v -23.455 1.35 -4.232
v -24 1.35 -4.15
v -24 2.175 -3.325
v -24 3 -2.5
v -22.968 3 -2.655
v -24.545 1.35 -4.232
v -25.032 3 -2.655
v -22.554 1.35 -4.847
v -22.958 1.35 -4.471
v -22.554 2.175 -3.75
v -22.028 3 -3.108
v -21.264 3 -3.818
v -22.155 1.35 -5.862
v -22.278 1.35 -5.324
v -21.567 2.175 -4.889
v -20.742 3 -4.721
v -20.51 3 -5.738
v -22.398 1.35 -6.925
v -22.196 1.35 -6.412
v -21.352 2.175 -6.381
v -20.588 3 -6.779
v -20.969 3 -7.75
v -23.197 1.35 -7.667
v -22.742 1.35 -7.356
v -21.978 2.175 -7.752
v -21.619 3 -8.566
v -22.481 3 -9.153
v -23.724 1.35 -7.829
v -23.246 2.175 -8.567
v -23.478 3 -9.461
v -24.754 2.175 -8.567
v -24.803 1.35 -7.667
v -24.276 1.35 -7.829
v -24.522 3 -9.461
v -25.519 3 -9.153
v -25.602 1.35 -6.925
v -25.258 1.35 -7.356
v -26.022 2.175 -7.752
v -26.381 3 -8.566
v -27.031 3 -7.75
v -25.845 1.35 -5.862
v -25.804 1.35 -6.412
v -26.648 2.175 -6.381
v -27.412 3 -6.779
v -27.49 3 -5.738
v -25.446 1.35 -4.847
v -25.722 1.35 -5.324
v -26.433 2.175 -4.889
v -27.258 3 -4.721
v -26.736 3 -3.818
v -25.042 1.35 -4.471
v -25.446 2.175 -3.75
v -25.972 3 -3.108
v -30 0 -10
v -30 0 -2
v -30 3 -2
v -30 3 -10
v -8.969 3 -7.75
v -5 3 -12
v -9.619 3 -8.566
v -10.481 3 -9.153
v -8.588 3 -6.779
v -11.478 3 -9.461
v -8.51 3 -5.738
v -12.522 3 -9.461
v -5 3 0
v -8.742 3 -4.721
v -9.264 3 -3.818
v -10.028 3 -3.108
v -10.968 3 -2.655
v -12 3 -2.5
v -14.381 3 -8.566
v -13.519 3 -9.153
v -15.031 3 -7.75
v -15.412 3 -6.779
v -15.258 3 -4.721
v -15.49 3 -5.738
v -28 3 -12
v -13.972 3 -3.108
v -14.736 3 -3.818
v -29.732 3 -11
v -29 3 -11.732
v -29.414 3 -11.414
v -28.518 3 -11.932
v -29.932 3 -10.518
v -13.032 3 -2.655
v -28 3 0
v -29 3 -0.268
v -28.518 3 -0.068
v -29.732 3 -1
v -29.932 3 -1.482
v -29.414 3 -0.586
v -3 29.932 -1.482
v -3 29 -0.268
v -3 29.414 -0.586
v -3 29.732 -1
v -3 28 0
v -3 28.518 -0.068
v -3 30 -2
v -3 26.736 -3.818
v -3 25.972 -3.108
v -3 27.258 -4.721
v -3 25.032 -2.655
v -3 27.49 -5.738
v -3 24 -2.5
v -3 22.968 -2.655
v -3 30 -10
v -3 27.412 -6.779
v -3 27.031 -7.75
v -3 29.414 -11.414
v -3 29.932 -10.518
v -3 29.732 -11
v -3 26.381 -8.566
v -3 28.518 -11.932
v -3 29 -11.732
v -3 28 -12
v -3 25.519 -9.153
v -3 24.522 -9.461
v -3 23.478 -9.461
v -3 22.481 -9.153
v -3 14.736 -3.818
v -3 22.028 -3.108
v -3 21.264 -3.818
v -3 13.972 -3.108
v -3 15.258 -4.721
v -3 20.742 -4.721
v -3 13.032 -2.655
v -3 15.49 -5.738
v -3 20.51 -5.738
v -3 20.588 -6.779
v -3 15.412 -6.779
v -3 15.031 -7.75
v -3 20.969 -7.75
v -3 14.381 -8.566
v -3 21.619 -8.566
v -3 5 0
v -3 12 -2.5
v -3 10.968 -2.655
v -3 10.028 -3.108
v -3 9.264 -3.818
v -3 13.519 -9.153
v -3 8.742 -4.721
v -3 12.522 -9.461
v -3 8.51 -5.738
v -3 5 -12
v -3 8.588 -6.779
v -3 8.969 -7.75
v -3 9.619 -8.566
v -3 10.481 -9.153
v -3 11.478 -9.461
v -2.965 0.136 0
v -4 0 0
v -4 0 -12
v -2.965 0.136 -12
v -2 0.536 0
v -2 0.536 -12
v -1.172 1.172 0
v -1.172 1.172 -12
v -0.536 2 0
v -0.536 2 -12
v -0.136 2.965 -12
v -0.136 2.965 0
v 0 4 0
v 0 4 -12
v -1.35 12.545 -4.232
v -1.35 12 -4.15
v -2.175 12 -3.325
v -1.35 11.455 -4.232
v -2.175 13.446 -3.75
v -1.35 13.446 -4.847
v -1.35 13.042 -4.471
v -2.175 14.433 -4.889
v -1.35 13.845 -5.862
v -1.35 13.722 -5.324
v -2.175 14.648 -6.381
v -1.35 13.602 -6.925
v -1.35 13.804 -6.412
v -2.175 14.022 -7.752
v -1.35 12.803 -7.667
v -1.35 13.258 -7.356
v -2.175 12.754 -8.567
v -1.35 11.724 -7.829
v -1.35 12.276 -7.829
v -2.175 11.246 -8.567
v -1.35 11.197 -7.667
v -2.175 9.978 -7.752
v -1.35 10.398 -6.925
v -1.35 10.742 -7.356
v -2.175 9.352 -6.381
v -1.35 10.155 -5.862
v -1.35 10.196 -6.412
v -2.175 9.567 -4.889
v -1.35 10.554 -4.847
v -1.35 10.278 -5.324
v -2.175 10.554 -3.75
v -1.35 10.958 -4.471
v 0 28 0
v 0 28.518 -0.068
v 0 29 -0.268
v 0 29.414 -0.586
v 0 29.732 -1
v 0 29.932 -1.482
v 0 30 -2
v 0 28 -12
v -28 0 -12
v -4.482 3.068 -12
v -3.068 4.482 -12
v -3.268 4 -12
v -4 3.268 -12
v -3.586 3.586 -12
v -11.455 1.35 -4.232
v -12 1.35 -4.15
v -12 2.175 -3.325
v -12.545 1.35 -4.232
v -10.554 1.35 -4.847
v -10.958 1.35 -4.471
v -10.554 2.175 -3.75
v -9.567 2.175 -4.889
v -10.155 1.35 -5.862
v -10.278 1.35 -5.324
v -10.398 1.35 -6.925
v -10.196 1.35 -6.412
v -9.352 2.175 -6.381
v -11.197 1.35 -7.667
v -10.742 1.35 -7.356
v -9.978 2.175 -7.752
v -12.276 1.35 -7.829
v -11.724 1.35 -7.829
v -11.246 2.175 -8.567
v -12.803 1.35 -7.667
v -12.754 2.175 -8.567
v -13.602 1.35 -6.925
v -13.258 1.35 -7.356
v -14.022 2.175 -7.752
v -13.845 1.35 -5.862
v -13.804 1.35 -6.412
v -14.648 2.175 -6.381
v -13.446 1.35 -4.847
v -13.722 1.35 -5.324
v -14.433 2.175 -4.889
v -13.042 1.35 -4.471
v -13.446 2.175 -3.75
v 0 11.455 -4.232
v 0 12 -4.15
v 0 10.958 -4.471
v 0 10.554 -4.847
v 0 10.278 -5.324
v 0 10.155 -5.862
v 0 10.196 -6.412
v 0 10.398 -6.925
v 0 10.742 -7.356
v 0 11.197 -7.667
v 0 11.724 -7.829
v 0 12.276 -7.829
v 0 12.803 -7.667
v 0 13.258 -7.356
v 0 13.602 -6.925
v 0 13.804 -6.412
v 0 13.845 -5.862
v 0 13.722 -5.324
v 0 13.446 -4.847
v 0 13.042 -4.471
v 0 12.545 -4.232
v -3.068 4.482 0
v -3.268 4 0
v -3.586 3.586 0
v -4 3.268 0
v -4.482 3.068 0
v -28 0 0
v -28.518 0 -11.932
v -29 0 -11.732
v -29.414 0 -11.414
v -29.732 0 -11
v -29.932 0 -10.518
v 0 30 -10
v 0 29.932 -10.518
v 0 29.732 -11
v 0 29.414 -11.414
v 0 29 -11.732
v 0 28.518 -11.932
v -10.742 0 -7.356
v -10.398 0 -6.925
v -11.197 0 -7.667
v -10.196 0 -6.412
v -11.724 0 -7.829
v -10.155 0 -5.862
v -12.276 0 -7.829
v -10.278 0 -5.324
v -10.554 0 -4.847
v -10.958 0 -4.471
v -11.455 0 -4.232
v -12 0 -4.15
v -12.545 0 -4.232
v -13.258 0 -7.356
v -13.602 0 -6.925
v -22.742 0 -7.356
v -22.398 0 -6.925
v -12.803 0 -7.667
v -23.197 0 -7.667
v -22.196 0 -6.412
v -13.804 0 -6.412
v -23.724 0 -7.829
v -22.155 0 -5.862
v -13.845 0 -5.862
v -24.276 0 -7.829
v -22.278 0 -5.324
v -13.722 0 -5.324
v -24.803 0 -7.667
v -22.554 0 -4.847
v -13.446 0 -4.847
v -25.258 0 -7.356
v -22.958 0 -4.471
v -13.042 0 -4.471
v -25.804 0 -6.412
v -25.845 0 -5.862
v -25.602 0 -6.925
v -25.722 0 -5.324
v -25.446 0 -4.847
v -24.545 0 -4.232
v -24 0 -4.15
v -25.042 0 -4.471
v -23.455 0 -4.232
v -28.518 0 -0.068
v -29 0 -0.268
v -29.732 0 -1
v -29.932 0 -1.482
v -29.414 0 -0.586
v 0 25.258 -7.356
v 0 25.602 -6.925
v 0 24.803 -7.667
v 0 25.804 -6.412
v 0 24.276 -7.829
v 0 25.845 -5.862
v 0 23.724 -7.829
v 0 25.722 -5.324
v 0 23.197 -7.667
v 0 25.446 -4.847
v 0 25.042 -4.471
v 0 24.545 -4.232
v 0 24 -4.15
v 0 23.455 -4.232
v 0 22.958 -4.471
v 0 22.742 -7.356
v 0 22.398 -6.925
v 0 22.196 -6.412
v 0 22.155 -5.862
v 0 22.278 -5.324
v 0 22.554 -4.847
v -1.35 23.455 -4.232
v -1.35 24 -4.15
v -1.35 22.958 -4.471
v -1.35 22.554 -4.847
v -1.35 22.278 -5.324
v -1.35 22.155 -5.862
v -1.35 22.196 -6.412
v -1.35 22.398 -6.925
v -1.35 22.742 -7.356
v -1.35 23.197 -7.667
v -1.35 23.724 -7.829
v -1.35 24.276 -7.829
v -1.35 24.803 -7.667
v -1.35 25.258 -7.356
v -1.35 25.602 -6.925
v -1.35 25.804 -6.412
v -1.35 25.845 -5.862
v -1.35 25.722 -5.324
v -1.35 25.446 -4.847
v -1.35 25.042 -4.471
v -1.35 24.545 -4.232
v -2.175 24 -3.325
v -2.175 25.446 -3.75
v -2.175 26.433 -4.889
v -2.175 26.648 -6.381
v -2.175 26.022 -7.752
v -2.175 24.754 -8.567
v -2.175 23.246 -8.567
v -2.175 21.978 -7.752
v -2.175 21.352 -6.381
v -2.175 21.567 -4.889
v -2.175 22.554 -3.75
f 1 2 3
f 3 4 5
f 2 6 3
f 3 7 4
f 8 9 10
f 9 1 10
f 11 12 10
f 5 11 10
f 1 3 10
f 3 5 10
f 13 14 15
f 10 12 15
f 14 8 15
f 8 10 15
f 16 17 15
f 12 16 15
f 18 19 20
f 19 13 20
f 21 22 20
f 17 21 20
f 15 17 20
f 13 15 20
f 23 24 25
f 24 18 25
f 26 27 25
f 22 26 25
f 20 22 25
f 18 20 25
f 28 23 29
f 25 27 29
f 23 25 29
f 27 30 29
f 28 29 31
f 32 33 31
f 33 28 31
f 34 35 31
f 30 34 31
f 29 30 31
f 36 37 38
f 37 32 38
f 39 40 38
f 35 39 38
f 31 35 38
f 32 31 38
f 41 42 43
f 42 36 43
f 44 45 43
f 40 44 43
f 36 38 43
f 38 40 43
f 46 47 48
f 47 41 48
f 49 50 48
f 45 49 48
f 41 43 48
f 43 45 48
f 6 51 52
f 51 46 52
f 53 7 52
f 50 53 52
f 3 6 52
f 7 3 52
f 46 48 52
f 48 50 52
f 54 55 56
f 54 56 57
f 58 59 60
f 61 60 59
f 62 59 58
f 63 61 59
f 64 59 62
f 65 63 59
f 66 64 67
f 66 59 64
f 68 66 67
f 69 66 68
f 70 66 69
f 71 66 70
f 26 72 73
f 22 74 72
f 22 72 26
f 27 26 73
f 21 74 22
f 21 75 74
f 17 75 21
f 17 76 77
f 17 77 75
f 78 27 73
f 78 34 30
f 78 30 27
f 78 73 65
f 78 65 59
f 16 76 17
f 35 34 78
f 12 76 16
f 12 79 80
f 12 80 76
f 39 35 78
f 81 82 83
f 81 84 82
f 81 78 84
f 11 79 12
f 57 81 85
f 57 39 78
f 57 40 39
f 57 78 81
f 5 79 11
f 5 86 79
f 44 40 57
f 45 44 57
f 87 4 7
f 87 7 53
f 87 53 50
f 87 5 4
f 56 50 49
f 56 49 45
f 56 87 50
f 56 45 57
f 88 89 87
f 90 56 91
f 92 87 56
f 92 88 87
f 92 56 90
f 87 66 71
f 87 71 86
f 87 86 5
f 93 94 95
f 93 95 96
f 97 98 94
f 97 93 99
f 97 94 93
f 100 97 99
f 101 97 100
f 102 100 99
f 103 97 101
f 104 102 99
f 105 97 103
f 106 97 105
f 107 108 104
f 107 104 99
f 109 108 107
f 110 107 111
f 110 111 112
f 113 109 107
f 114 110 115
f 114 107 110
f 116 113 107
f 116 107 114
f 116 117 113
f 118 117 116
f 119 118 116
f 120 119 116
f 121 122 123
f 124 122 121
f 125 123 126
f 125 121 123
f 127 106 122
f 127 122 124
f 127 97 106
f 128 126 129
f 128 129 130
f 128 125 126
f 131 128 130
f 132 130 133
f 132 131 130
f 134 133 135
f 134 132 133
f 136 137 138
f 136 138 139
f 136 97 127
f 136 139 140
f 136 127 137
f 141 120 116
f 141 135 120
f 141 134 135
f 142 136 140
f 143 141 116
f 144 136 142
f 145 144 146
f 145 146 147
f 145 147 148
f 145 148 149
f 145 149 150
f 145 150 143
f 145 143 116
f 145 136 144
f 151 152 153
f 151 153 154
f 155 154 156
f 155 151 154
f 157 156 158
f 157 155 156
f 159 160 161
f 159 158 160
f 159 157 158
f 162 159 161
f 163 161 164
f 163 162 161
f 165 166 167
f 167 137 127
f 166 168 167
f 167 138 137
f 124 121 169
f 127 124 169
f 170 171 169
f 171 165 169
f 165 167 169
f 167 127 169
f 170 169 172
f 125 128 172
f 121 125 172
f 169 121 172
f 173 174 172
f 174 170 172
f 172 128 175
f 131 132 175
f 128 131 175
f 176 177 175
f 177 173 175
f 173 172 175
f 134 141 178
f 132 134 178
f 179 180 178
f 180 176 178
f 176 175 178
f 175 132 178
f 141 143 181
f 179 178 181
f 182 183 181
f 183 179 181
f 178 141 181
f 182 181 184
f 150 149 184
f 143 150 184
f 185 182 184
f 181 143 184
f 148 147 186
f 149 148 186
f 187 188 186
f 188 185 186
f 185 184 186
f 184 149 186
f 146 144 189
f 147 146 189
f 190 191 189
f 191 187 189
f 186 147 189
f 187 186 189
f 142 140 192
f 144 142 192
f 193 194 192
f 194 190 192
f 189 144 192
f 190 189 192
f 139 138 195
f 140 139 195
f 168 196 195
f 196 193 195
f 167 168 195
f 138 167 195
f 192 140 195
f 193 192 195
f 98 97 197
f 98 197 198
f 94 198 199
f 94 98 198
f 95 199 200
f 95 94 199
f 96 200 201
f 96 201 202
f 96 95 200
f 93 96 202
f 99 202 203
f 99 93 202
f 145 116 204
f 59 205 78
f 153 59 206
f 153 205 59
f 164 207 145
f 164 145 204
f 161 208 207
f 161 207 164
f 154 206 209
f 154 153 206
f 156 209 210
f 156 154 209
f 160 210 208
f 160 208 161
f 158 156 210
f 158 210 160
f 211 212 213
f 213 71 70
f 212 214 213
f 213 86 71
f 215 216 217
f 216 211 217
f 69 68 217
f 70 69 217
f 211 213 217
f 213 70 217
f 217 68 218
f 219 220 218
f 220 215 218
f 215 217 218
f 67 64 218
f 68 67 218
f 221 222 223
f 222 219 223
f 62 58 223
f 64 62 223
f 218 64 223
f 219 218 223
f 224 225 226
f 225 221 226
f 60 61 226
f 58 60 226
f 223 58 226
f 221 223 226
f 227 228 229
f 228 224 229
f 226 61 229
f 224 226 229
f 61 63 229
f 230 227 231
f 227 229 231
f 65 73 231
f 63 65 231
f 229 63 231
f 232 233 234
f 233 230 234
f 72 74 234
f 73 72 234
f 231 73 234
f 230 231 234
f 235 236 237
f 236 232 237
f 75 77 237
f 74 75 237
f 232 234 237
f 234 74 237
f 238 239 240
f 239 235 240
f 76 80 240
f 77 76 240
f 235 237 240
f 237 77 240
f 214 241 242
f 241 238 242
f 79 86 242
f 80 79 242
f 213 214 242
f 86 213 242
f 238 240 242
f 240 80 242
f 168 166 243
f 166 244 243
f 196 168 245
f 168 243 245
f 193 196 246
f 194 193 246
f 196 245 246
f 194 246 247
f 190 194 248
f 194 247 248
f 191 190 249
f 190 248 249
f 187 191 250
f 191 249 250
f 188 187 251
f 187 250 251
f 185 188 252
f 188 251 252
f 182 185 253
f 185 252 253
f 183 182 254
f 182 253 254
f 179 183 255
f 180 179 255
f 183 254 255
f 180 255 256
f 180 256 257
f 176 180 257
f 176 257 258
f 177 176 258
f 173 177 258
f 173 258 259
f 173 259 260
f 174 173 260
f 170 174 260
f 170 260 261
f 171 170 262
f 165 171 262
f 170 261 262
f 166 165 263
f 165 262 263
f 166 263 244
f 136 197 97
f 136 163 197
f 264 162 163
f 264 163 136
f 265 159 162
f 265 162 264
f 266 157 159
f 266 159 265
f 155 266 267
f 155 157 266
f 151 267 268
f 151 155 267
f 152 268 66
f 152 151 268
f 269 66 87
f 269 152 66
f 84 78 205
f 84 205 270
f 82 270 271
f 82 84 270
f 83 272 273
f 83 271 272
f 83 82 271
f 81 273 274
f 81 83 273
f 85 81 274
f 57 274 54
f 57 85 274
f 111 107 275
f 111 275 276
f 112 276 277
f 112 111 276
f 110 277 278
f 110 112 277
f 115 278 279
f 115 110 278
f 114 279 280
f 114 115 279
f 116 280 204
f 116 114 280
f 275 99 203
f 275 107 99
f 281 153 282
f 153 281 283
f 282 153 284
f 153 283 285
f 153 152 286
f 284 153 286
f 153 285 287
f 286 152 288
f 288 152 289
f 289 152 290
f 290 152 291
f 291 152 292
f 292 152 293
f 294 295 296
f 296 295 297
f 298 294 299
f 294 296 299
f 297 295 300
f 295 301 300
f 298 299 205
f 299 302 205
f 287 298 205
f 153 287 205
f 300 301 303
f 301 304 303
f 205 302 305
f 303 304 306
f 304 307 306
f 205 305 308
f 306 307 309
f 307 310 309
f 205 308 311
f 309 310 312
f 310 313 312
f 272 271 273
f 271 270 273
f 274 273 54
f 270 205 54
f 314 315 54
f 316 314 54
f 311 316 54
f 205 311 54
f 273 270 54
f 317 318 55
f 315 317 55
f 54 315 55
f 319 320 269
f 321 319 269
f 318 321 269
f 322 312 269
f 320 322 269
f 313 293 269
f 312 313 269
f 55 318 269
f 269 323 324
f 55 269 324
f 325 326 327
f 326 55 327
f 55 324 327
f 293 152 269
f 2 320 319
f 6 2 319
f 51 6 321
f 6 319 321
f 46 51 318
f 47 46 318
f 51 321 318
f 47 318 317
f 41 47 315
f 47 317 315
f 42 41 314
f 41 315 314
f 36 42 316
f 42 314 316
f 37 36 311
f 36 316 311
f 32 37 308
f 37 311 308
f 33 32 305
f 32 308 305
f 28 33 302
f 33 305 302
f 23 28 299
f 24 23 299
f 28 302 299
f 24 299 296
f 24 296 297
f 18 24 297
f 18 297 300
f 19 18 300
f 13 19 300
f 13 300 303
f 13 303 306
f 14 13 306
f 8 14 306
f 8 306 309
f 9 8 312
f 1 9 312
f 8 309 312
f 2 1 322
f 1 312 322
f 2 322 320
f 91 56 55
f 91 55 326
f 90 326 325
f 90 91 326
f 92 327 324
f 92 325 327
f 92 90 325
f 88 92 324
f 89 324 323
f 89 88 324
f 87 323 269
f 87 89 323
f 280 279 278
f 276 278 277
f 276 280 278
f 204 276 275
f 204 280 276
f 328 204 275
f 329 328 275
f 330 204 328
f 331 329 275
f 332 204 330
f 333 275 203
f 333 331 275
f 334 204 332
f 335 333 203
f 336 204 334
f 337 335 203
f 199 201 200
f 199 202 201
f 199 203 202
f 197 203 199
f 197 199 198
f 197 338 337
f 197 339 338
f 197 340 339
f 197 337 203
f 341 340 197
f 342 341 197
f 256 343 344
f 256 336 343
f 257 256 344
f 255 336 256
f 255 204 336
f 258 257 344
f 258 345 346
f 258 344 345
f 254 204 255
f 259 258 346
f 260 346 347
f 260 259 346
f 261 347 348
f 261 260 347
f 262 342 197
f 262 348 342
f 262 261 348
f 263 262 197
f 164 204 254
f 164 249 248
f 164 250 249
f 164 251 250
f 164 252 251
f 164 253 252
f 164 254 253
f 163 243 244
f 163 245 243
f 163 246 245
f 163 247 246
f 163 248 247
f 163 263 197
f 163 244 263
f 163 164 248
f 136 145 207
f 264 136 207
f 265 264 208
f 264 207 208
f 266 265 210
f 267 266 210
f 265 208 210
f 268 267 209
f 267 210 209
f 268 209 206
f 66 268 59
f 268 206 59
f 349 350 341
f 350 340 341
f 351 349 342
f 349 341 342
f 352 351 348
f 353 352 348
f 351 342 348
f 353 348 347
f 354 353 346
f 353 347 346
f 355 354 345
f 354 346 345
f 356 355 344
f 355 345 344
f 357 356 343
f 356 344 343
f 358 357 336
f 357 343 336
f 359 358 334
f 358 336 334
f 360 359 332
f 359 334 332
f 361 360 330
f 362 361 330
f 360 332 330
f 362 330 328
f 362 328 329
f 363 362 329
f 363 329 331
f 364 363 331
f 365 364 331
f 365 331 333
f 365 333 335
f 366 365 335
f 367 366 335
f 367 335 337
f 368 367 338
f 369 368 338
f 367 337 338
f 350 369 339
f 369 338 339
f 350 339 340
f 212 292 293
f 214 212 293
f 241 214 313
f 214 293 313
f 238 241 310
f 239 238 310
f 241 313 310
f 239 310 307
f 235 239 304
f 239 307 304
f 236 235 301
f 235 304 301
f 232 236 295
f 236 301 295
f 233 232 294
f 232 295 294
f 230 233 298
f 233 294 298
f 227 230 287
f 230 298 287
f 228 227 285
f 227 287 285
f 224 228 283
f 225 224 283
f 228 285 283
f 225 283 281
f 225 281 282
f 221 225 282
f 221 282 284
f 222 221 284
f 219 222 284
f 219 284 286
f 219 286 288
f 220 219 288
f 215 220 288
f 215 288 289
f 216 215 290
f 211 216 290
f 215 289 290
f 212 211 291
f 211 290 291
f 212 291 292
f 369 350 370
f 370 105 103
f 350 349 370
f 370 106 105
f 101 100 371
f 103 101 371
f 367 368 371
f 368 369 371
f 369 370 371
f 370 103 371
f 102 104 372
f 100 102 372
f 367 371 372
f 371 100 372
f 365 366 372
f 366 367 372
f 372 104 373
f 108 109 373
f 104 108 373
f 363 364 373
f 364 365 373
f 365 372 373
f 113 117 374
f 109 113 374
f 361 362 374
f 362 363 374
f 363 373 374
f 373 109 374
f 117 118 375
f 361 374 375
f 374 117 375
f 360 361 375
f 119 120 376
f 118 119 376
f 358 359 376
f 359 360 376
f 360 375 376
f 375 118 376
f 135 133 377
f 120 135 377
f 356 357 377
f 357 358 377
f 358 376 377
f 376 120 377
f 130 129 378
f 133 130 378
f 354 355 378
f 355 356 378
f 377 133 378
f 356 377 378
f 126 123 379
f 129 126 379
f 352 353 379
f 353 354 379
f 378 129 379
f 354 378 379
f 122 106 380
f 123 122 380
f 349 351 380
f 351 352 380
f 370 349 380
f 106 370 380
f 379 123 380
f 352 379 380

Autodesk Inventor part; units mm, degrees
ref_plane "YZ Plane" through (0, 0, 0) normal (1, 0, 0) x (0, 1, 0)
ref_plane "XZ Plane" through (0, 0, 0) normal (0, 1, 0) x (-1, 0, 0)
ref_plane "XY Plane" through (0, 0, 0) normal (0, 0, 1) x (1, 0, 0)
sketch "Sketch1" plane through (0, 0, 0) normal (0, 1, 0) x (-1, 0, 0)
  line L0 (0, 0) -> (30, 0)
  line L1 (30, 0) -> (30, -12)
  line L2 (30, -12) -> (0, -12)
  line L3 (0, -12) -> (0, 0)
  dimension "d0" = 30
  dimension "d1" = 12
extrude "Extrusion1" add sketch "Sketch1" along normal blind 3
sketch "Sketch2" plane through (0, 3, 0) normal (0, 1, 0) x (1, 0, 0)
  line L0 (0, 0) -> (0, 12) projected
  line L1 (0, 12) -> (-30, 12) projected
  line L2 (0, 0) -> (-3, 0)
  line L3 (-3, 0) -> (-3, 12)
  line L4 (-3, 12) -> (0, 12)
  line L5 (0, 12) -> (0, 0)
  dimension "d4" = 3
extrude "Extrusion2" add sketch "Sketch2" along normal blind 27
sketch "Sketch4" plane through (0, 3, 0) normal (0, 1, 0) x (1, 0, 0)
  line L0 (-45.2087, 6) -> (21.2087, 6) construction
  line L1 (-30, 12) -> (-30, 0) projected
  line L2 (0, 0) -> (0, 12) projected
  point P0 (-30, 6)
  point P1 (-24, 6)
  point P2 (-12, 6)
  dimension "d7" = 12
  dimension "d9" = 18
hole "Hole1" at (-24, 3, -6) at (-12, 3, -6) direction (0, -1, 0) diameter 3.7 end through all countersink diameter 7 countersink angle 90
sketch "Sketch5" plane through (-3, 3, -12) normal (-1, 0, 0) x (0, 0, 1)
  line L0 (6, -9.8393) -> (6, 36.305) construction
  line L1 (0, -3) -> (12, -3) projected
  line L2 (0, 27) -> (12, 27) projected
  point P0 (6, -3)
  point P1 (6, 9)
  point P2 (6, 21)
  dimension "d17" = 12
  dimension "d18" = 18
hole "Hole2" at (-3, 12, -6) at (-3, 24, -6) direction (1, 0, 0) diameter 3.7 end through all countersink diameter 7 countersink angle 90
fillet "Fillet1" radius 2 5 edges at (-1.5, 30, -12) (-1.5, 30, 0) (-3, 3, -6) (-30, 1.5, 0) (-30, 1.5, -12)
fillet "Fillet2" radius 4 1 edges at (0, 0, -6)
properties part number "Right Bracket 30mm RS749-1686"
